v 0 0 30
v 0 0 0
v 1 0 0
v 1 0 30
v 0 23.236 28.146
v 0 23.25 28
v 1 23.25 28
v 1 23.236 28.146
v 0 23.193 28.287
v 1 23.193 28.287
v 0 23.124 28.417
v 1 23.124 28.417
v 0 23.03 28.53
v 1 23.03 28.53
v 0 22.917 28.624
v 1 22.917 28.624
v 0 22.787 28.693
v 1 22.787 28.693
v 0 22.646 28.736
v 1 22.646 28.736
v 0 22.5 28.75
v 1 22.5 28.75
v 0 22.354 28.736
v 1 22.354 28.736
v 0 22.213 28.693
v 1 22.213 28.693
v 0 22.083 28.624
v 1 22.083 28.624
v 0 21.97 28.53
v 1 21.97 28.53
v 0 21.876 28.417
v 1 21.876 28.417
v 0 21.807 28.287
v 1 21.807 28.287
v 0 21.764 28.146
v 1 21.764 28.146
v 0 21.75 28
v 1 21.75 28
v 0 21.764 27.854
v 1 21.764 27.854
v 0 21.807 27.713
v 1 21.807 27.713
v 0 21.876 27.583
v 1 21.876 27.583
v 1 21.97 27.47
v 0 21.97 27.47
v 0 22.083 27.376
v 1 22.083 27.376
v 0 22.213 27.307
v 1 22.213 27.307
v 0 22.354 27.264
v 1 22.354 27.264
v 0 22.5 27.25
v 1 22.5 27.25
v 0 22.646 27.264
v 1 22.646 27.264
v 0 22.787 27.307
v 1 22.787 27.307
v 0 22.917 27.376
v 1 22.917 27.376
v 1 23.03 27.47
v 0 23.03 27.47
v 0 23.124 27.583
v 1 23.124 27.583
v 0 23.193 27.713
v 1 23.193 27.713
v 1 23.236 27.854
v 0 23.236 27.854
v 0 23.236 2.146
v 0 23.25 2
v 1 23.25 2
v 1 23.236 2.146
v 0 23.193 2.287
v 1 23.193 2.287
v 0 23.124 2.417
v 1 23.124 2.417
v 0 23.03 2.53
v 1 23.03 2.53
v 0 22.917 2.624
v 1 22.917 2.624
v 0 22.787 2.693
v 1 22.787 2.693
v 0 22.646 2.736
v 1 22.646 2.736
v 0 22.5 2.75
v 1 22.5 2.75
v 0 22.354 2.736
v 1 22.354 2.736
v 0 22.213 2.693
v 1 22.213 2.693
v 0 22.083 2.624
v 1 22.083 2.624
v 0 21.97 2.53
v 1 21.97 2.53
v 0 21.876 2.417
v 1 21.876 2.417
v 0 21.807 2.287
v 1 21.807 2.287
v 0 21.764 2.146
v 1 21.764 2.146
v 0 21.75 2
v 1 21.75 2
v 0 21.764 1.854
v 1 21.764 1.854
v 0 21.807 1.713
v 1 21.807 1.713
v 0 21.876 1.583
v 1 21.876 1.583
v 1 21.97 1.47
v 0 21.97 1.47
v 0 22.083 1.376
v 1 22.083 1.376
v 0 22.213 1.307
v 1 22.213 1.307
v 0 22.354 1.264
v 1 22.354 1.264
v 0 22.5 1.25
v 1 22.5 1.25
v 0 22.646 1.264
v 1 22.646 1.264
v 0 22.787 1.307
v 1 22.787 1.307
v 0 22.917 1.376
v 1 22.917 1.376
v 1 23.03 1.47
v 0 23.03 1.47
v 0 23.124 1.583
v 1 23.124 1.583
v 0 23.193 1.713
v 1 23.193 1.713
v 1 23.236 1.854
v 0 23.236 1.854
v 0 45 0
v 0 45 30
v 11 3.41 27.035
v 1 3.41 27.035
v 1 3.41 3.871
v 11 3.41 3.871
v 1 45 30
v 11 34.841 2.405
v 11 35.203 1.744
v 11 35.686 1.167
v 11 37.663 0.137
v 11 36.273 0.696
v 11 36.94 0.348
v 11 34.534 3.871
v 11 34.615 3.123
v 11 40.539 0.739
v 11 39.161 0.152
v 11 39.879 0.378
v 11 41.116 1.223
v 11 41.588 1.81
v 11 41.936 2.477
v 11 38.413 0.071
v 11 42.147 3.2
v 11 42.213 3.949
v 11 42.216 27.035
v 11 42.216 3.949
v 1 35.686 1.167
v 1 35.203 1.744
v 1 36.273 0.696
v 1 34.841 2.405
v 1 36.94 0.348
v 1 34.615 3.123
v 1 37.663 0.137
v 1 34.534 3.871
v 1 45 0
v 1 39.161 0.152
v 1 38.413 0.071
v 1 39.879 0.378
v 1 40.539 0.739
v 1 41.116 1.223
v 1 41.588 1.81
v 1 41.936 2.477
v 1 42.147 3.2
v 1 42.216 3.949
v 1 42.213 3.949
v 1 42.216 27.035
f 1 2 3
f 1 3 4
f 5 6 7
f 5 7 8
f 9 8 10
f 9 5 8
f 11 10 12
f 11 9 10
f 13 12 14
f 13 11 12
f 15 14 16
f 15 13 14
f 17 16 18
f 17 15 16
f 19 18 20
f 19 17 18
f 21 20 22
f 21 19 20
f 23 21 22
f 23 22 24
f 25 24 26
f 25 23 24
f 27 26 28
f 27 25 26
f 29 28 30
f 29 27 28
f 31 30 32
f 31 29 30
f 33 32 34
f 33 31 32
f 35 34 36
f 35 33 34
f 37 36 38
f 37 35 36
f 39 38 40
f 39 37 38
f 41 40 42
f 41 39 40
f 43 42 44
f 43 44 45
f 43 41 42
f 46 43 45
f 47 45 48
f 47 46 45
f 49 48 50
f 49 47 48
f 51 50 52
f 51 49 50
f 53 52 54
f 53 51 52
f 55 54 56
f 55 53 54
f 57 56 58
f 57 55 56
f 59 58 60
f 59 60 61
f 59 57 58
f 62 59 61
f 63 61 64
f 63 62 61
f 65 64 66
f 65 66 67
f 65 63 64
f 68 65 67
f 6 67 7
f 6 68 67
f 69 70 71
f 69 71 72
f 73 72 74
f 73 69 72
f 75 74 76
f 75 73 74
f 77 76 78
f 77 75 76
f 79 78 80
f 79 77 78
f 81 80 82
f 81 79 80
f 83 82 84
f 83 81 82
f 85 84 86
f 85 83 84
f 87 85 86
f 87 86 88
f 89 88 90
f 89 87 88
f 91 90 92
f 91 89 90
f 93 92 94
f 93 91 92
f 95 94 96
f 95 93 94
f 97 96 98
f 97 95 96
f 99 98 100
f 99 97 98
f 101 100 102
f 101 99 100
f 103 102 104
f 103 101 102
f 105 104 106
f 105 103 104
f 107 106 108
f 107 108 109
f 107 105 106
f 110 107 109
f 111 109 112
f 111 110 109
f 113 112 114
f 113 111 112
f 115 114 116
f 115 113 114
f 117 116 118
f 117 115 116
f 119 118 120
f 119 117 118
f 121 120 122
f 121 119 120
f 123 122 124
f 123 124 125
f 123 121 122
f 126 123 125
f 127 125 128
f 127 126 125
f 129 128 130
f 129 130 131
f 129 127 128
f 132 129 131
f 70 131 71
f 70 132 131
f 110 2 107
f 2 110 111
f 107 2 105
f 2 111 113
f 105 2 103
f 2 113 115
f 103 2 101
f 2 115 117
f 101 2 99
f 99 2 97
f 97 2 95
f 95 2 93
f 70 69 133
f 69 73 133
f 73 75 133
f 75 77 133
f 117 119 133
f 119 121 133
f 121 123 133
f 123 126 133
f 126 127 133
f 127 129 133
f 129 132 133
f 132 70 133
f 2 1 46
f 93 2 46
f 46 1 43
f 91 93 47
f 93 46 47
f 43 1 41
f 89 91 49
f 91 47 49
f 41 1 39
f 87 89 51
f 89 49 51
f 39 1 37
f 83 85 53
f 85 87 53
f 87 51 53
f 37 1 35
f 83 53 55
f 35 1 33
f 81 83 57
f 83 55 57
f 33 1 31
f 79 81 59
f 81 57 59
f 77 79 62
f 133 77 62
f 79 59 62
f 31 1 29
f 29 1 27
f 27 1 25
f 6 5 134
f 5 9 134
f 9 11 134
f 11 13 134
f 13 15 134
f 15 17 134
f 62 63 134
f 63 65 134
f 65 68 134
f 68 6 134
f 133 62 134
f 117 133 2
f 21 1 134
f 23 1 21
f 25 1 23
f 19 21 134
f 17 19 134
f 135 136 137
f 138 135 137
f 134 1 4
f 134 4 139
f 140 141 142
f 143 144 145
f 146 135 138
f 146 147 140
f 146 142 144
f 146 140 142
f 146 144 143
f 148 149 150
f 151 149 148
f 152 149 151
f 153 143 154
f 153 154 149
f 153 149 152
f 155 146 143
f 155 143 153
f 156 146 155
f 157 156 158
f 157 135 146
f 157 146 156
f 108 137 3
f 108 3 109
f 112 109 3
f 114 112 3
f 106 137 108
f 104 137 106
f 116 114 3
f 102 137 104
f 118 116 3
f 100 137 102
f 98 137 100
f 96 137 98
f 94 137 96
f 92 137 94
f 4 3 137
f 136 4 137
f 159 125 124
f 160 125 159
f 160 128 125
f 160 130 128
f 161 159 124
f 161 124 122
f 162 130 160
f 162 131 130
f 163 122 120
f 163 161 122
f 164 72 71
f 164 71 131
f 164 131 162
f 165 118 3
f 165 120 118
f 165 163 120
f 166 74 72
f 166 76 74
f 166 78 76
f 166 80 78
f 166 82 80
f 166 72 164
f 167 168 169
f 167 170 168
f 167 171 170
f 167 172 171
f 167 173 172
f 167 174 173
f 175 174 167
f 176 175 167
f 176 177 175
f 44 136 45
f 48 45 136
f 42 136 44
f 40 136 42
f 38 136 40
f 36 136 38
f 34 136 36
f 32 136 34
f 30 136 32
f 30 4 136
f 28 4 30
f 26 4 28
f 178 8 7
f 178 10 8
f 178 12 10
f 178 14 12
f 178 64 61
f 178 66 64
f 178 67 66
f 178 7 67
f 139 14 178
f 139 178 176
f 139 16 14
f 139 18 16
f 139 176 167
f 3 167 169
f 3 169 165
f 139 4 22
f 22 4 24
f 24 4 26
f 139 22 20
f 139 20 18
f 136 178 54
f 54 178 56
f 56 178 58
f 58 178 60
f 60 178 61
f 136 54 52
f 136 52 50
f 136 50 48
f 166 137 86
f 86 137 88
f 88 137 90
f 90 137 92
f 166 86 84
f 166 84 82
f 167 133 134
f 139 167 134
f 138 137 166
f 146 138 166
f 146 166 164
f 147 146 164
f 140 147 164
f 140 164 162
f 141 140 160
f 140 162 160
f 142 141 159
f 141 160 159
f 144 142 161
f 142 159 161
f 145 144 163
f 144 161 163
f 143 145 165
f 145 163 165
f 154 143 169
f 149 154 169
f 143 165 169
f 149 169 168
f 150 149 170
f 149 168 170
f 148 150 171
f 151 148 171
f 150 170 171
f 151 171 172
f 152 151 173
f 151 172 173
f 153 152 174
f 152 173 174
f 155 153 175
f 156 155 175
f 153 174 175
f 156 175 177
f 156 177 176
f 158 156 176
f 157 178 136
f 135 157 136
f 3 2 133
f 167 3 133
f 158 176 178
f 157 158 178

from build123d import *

# Parameters (mm, degrees)
F0_W     = 45
F0_H     = 30
F0_R     = 0.75
F1_DEPTH = 1
F3_DEPTH = 10


with BuildPart() as f1:
    # F0 (on Right) → F1 (new body)
    with BuildSketch(Plane.YZ):
        with Locations((22.5, 15)):
            Rectangle(F0_W, F0_H)
        with Locations((22.5, 2)):
            Circle(F0_R, mode=Mode.SUBTRACT)
        with Locations((22.5, 28)):
            Circle(F0_R, mode=Mode.SUBTRACT)
    extrude(amount=F1_DEPTH)

    # F2 (on face) → F3 (join)
    with BuildSketch(Plane.YZ.offset(1)):
        with BuildLine():
            Line((42.216498, 27.034795), (3.409794, 27.034795))
            Line((3.409794, 27.034795), (3.409794, 3.871003))
            Line((3.409794, 3.871003), (34.534011, 3.871003))
            ThreePointArc((34.534011, 3.871003), (38.41285, 0.07055), (42.213303, 3.949389))
            Line((42.213303, 3.949389), (42.216498, 3.949389))
            Line((42.216498, 3.949389), (42.216498, 27.034795))
        make_face()
    extrude(amount=F3_DEPTH)


solid = f1.part
